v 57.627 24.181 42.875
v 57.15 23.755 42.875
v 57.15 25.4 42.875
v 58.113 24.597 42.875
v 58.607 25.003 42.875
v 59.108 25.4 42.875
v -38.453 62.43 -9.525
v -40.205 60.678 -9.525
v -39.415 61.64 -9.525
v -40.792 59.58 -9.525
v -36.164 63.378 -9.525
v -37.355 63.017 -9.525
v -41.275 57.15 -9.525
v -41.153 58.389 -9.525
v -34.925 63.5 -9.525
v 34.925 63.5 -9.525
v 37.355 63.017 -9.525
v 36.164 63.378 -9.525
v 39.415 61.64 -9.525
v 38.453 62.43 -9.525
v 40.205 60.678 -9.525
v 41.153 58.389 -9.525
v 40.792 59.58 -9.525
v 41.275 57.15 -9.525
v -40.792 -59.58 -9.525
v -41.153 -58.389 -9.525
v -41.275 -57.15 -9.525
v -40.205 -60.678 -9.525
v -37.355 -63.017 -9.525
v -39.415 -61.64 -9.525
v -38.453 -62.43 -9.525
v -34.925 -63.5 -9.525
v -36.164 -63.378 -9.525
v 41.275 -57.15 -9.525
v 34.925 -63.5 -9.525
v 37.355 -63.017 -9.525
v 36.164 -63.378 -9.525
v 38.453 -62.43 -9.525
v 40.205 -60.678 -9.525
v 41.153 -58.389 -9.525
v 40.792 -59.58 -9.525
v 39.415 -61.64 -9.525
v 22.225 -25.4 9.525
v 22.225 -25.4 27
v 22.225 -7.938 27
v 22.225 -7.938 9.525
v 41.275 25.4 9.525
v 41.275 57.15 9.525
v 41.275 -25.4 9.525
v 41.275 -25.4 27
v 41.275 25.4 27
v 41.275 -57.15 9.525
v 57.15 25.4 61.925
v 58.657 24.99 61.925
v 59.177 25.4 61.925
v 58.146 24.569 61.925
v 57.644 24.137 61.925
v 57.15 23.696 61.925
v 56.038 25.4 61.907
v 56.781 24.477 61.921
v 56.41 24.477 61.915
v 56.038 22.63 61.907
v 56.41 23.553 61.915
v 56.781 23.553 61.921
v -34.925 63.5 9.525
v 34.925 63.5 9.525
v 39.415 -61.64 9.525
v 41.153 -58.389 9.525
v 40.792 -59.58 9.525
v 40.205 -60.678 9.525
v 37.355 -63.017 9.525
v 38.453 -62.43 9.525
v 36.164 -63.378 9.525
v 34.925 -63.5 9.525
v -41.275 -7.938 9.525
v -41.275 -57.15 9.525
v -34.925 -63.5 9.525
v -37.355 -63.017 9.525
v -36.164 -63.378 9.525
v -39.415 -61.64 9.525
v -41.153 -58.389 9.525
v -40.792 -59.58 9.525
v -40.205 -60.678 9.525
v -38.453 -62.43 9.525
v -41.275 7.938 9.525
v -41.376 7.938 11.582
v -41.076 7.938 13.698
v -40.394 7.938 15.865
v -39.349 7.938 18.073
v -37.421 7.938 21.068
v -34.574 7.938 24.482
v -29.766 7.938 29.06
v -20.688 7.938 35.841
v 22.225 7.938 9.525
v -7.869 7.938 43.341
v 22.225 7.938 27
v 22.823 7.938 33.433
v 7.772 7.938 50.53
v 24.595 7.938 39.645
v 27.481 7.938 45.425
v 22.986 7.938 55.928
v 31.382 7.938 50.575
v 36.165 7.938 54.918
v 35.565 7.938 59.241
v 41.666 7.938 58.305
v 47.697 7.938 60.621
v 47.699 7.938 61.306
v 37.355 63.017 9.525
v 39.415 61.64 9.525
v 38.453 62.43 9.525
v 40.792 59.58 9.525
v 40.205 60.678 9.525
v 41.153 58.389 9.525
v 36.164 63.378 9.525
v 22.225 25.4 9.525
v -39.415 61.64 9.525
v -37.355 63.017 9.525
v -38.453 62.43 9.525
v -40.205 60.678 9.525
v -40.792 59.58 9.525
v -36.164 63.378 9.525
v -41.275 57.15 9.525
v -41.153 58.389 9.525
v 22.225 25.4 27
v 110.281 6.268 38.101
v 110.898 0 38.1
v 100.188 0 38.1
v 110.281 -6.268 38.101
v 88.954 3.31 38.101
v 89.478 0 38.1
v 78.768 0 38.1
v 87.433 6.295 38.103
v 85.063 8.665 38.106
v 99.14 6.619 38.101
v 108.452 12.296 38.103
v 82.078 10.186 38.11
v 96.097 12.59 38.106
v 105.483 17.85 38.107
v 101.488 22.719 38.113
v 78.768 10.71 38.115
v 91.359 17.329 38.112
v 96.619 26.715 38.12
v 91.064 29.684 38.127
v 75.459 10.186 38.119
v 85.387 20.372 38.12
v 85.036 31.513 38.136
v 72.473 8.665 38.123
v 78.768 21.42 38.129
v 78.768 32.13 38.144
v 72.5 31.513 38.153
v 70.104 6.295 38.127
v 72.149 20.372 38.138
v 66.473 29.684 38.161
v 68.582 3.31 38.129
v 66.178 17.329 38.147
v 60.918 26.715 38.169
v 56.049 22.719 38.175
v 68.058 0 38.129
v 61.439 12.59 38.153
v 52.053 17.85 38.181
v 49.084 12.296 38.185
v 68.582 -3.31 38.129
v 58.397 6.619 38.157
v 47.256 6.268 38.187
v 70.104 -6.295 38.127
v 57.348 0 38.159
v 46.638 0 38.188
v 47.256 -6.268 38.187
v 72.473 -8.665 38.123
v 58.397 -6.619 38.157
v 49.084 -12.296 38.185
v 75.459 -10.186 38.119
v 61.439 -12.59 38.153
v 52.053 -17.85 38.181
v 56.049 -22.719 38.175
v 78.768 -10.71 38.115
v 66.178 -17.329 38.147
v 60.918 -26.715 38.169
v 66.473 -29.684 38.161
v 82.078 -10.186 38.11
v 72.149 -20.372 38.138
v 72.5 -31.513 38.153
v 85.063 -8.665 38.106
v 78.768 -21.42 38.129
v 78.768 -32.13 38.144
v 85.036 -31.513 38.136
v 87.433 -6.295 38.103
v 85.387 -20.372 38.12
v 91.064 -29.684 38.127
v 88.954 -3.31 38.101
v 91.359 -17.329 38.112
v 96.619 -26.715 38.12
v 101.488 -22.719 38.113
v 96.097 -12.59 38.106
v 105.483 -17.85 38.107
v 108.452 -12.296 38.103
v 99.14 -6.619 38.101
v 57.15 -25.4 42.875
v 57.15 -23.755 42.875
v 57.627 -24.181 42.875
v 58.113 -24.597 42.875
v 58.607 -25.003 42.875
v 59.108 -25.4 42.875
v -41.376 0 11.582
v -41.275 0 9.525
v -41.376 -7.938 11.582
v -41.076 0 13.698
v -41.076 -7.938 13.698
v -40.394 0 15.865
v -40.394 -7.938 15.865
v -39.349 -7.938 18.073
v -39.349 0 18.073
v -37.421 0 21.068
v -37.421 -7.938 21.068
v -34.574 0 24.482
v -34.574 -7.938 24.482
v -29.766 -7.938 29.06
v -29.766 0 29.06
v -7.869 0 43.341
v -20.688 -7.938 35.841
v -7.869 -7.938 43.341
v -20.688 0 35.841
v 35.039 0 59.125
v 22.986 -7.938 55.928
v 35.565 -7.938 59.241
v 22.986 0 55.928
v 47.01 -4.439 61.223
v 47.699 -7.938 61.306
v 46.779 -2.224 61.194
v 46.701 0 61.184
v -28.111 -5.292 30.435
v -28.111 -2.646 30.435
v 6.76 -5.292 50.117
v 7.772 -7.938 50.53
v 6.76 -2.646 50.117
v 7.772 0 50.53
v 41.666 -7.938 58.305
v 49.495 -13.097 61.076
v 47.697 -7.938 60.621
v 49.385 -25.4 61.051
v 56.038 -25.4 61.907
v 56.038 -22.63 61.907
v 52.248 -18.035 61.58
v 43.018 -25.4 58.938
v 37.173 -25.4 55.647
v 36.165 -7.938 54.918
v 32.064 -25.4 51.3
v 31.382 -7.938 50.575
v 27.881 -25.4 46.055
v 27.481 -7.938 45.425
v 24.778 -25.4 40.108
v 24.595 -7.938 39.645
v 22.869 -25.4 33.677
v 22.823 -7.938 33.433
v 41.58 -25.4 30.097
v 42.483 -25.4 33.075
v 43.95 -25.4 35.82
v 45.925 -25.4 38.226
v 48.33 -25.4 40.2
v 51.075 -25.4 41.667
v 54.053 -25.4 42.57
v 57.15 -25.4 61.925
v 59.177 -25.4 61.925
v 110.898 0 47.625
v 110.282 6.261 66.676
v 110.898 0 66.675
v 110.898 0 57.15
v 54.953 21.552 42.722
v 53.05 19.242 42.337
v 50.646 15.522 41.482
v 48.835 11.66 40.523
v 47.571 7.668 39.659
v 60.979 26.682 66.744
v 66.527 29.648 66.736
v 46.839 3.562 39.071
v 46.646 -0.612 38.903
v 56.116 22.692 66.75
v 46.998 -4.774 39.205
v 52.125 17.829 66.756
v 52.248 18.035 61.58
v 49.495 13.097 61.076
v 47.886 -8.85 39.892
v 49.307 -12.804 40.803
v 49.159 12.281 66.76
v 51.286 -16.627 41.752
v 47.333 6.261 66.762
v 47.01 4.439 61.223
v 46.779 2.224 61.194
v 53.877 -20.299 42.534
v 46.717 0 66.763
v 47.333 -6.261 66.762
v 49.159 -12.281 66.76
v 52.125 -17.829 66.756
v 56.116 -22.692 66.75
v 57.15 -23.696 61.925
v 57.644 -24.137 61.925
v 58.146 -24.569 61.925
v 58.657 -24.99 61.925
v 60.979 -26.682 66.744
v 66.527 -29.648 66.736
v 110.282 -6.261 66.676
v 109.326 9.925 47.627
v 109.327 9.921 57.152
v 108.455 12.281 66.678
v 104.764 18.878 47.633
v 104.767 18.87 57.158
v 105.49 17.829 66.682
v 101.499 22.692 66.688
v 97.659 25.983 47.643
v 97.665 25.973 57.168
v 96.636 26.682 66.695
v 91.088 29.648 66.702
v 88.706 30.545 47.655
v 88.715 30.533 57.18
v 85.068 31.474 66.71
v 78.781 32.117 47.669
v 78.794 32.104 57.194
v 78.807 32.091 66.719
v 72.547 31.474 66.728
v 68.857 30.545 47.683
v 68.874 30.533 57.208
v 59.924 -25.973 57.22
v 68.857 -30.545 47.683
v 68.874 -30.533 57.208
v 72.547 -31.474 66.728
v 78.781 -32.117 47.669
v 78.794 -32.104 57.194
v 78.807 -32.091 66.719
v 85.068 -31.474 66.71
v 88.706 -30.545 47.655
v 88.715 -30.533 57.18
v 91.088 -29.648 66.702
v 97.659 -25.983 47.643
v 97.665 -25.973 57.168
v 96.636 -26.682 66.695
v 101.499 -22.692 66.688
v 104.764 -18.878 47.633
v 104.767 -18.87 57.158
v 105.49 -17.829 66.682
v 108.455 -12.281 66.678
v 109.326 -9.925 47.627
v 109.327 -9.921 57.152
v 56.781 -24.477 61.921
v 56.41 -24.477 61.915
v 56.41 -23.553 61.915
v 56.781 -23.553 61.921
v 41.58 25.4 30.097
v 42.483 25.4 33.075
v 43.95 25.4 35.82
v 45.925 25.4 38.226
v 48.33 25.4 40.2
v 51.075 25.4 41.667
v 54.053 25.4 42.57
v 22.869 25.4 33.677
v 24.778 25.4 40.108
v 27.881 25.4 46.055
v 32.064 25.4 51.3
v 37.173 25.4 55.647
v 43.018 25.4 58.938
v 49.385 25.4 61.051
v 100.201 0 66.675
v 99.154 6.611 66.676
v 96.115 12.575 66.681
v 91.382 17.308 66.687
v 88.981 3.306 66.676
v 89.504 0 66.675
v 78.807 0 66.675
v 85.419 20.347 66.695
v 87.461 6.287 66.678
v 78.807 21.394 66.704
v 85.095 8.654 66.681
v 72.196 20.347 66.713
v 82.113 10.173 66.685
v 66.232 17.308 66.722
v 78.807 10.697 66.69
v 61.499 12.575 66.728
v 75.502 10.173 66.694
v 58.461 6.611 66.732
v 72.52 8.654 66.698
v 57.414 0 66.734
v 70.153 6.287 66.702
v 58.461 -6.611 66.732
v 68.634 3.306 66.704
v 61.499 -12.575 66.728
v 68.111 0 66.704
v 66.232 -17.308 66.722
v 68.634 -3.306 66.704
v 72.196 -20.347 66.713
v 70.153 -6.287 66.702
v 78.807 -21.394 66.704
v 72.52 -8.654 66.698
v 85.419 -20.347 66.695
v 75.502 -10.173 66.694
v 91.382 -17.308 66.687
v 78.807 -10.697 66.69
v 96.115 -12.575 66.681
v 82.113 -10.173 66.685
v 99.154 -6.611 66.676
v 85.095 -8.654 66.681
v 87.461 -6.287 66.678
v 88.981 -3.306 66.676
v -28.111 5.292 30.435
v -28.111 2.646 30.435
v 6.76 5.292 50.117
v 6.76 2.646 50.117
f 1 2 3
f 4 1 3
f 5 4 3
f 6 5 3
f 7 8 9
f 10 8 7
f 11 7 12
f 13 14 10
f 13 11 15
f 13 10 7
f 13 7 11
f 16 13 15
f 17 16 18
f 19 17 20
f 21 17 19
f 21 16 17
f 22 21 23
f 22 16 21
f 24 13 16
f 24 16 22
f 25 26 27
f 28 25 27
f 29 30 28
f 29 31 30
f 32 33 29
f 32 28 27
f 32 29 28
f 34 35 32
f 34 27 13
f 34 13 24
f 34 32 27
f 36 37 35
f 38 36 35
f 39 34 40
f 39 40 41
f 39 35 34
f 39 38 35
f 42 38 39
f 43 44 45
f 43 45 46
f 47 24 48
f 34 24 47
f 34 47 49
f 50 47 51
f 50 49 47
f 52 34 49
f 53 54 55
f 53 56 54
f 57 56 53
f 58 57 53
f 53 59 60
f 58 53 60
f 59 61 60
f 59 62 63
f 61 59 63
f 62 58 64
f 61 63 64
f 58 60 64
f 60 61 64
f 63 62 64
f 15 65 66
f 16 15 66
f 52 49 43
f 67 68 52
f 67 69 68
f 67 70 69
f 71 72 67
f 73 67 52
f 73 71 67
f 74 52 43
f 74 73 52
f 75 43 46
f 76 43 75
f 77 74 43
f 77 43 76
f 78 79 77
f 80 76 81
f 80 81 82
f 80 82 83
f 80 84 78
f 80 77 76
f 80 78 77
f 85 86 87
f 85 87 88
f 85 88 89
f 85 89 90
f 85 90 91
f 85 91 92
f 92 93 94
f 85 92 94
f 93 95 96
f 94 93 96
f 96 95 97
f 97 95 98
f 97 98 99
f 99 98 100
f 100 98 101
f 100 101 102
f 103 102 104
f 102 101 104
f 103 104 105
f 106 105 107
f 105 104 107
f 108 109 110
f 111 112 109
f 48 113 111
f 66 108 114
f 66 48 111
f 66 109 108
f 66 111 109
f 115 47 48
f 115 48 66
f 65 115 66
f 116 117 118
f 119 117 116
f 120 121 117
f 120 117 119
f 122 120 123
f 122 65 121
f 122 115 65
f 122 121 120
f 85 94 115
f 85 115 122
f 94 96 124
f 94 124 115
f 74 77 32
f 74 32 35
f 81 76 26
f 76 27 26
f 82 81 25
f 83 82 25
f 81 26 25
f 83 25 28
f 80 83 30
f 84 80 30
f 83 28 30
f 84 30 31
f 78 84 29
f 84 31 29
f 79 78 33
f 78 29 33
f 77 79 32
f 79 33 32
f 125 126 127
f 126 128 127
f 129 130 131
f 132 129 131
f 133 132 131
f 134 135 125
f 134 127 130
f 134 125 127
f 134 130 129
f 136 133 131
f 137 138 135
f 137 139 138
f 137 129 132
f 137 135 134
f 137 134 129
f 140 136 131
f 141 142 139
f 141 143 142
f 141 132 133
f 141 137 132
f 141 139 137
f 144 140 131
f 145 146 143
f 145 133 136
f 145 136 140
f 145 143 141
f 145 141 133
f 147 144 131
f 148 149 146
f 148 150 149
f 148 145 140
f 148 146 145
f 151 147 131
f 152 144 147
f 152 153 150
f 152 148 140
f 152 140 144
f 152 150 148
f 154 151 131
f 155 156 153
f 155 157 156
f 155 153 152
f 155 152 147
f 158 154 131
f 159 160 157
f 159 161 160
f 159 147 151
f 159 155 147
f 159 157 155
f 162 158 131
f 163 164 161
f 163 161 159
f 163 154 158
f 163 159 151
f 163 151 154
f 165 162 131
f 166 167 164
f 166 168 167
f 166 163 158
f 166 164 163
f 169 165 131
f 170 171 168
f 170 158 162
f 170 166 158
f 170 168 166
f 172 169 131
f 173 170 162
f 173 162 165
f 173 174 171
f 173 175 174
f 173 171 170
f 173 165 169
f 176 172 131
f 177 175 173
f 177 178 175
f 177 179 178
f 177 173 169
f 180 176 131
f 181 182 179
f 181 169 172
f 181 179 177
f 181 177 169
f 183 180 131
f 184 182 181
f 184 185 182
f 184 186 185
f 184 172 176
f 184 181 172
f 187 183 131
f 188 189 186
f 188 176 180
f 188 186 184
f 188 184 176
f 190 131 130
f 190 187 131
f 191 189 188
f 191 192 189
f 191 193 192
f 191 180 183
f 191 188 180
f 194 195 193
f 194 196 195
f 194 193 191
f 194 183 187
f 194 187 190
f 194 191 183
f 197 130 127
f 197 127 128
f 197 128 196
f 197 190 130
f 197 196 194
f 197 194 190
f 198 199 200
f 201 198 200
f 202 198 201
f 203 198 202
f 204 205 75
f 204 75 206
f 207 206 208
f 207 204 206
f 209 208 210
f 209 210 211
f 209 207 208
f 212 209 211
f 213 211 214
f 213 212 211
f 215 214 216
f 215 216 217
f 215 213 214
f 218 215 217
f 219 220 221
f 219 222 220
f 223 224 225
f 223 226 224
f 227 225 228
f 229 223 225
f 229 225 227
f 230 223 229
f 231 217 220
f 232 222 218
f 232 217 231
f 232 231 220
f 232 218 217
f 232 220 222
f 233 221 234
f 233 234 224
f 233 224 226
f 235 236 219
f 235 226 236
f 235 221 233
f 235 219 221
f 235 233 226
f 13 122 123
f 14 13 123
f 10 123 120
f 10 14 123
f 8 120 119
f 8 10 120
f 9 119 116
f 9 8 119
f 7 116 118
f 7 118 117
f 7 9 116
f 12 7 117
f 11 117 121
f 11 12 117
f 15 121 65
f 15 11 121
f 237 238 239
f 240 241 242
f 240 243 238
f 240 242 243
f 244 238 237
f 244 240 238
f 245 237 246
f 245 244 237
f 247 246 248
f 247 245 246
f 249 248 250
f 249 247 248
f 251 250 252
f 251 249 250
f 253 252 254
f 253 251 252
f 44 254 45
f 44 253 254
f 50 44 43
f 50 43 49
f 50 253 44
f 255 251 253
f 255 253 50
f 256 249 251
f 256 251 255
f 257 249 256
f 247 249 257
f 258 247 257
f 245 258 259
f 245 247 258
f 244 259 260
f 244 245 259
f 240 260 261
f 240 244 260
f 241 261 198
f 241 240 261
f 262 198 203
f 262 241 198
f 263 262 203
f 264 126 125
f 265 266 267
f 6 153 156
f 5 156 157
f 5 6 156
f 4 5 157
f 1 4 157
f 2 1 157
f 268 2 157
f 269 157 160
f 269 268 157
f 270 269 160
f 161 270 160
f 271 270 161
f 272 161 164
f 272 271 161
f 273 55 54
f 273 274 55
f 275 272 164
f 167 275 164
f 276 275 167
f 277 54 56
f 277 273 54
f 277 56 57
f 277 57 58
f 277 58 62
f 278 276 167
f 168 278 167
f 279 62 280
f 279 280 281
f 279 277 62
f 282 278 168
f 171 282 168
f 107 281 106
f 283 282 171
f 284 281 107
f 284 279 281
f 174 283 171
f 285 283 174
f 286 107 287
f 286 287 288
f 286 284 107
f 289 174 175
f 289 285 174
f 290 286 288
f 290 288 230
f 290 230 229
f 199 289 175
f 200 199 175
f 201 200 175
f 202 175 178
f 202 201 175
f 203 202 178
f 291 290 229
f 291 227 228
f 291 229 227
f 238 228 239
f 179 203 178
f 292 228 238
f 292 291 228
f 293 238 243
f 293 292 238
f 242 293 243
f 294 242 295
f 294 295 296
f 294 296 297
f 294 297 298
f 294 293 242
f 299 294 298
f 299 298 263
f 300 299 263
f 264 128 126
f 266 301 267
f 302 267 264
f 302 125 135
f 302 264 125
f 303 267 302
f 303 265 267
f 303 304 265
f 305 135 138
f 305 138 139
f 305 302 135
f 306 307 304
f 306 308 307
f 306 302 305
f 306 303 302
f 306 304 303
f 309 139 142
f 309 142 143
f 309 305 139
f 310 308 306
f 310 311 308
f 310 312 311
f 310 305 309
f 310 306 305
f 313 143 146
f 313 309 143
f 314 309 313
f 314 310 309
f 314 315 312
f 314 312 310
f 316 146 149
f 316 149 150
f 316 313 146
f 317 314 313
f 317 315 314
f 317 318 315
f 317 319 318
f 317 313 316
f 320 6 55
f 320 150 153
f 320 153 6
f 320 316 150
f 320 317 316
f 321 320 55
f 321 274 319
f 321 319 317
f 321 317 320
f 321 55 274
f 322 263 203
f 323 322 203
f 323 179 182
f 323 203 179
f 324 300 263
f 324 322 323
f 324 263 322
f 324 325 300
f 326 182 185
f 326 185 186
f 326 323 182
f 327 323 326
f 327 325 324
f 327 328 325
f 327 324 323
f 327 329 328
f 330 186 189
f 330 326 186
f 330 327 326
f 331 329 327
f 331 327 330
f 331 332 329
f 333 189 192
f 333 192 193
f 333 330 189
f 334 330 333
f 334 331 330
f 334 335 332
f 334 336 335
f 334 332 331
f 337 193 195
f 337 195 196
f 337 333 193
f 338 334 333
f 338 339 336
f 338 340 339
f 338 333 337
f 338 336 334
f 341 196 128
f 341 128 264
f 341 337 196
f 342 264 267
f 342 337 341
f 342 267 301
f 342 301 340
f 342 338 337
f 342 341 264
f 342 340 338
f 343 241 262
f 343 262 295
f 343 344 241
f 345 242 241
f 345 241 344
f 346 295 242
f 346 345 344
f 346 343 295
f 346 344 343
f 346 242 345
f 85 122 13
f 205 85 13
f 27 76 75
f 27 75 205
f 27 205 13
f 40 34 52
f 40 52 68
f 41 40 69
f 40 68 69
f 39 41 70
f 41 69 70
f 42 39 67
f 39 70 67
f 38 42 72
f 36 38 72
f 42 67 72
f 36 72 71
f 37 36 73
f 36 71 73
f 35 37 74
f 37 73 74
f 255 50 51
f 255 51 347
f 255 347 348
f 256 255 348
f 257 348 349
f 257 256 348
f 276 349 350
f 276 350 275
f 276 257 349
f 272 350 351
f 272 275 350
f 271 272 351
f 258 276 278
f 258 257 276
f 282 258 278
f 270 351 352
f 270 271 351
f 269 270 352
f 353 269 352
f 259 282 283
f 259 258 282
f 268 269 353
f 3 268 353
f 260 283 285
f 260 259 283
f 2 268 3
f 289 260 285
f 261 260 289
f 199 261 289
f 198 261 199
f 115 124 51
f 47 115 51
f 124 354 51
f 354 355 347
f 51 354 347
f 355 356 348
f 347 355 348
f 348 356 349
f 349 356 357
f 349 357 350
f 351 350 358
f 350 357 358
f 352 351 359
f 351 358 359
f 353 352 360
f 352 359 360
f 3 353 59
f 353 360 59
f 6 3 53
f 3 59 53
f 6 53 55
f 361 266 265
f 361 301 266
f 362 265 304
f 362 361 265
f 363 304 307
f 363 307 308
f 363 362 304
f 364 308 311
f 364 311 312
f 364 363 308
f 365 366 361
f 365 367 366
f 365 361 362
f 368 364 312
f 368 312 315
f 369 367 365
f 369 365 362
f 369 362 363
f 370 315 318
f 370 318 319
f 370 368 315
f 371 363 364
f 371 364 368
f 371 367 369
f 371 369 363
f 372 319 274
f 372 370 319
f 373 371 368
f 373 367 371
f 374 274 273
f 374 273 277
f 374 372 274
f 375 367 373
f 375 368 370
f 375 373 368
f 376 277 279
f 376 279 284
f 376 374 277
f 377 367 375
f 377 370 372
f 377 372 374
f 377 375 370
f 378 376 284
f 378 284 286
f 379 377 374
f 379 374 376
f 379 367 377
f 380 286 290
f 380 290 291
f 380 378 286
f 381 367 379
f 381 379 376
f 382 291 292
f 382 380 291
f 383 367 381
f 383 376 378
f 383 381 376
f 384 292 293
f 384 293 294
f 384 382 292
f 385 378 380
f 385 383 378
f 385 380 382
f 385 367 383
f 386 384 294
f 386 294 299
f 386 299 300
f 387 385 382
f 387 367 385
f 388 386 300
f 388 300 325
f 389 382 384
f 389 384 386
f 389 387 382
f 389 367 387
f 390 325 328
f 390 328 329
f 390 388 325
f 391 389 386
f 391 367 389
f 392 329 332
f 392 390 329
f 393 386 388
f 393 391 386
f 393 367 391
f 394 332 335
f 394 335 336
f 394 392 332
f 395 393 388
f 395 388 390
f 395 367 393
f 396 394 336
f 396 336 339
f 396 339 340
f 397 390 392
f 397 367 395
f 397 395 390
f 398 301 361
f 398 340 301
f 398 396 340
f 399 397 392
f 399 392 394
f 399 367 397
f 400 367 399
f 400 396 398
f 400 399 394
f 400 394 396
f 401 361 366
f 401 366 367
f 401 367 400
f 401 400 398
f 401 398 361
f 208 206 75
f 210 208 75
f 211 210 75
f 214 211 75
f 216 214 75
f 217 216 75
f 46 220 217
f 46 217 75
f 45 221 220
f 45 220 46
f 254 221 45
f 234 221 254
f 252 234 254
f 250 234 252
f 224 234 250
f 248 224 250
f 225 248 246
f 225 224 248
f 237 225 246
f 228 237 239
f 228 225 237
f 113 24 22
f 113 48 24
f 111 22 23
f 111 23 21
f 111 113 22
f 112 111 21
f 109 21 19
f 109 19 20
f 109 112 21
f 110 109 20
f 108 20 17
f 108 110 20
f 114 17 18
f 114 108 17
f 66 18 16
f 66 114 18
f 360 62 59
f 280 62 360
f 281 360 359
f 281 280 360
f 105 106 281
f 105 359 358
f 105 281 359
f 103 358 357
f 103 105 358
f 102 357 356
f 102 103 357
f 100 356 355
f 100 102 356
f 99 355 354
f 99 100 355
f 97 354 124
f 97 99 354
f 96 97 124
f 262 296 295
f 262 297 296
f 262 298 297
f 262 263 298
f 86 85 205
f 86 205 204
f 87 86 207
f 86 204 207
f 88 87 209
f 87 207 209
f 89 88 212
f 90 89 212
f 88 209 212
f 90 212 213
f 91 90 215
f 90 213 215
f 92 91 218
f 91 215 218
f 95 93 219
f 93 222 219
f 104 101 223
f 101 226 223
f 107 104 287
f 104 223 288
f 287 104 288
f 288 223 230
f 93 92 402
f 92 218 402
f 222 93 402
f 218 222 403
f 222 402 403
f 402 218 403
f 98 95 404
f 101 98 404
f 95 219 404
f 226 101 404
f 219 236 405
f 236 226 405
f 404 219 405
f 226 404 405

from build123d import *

# Parameters (mm, degrees)
F1_DEPTH = 63.5
F2_DEPTH = 25.4
F3_DEPTH = 7.9375
F5_R     = 6.35


with BuildPart() as f1:
    # F0 (on Front) → F1 (new body, symmetric)
    with BuildSketch(Plane.XZ):
        Polygon((41.275, -9.525), (41.275, 9.525), (22.225, 9.525), (-41.275, 9.525), (-41.275, -9.525), align=None)
    extrude(amount=F1_DEPTH, both=True)

    # F0 (on Front) → F2 (join, symmetric)
    with BuildSketch(Plane.XZ):
        with BuildLine():
            Line((22.225, 9.525), (41.275, 9.525))
            Line((41.275, 9.525), (41.275, 27.0002))
            ThreePointArc((41.275, 27.0002), (45.9246798487, 38.2255201513), (57.15, 42.8752))
            Line((57.15, 42.8752), (60.0982093367, 42.8752))
            Line((60.0982093367, 42.8752), (60.0982093367, 61.9252))
            Line((60.0982093367, 61.9252), (57.15, 61.9252))
            add(Edge.make_bspline(
                [(56.0381595364, 61.9074977439), (56.4108675509, 61.9161651955), (56.7815065443, 61.9220777941), (57.15, 61.9252)],
                knots=[110.4471262045, 110.4471262045, 110.4471262045, 110.4471262045, 111.5045361635, 111.5045361635, 111.5045361635, 111.5045361635], degree=3))
            ThreePointArc((56.0381595364, 61.9074977439), (32.064280425, 51.2996300016), (22.225, 27.0002))
            Line((22.225, 27.0002), (22.225, 9.525))
        make_face()
        Polygon((60.0982093367, 61.9252), (60.0982093367, 42.8752), (78.7747351631, 42.8752), (78.8008907845, 61.9252), align=None)
    extrude(amount=F2_DEPTH, both=True)

    # F0 (on Front) → F3 (join, symmetric)
    with BuildSketch(Plane.XZ):
        with BuildLine():
            Line((-41.275, 9.525), (22.225, 9.525))
            Line((22.225, 9.525), (22.225, 27.0002))
            ThreePointArc((22.225, 27.0002), (32.064280425, 51.2996300016), (56.0381595364, 61.9074977439))
            add(Edge.make_bspline(
                [(-41.275, 9.525), (-44.3938878809, 30.0415972741), (17.1085761993, 61.002177049), (56.0381595364, 61.9074977439)],
                knots=[0, 0, 0, 0, 110.4471262045, 110.4471262045, 110.4471262045, 110.4471262045], degree=3))
        make_face()
    extrude(amount=F3_DEPTH, both=True)

    # F0 (on Front) → F4 (revolve)
    with BuildSketch(Plane.XZ):
        Polygon((78.8008907845, 61.9252), (78.7747351631, 42.8752), (78.7681788206, 38.1), (110.8982093367, 38.1), (110.8982093367, 66.675), (78.8074122528, 66.675), align=None)
    revolve(axis=Axis((78.7877955367, 0, 52.3875), (0.0013729972, 0, 0.9999990574)))

    # F5
    f5_edges = [f1.edges().sort_by_distance(p)[0] for p in [
        (41.275, -63.5, 0),
        (-41.275, -63.5, 0),
        (41.275, 63.5, 0),
        (-41.275, 63.5, 0),
    ]]
    fillet(f5_edges, radius=F5_R)


solid = f1.part
